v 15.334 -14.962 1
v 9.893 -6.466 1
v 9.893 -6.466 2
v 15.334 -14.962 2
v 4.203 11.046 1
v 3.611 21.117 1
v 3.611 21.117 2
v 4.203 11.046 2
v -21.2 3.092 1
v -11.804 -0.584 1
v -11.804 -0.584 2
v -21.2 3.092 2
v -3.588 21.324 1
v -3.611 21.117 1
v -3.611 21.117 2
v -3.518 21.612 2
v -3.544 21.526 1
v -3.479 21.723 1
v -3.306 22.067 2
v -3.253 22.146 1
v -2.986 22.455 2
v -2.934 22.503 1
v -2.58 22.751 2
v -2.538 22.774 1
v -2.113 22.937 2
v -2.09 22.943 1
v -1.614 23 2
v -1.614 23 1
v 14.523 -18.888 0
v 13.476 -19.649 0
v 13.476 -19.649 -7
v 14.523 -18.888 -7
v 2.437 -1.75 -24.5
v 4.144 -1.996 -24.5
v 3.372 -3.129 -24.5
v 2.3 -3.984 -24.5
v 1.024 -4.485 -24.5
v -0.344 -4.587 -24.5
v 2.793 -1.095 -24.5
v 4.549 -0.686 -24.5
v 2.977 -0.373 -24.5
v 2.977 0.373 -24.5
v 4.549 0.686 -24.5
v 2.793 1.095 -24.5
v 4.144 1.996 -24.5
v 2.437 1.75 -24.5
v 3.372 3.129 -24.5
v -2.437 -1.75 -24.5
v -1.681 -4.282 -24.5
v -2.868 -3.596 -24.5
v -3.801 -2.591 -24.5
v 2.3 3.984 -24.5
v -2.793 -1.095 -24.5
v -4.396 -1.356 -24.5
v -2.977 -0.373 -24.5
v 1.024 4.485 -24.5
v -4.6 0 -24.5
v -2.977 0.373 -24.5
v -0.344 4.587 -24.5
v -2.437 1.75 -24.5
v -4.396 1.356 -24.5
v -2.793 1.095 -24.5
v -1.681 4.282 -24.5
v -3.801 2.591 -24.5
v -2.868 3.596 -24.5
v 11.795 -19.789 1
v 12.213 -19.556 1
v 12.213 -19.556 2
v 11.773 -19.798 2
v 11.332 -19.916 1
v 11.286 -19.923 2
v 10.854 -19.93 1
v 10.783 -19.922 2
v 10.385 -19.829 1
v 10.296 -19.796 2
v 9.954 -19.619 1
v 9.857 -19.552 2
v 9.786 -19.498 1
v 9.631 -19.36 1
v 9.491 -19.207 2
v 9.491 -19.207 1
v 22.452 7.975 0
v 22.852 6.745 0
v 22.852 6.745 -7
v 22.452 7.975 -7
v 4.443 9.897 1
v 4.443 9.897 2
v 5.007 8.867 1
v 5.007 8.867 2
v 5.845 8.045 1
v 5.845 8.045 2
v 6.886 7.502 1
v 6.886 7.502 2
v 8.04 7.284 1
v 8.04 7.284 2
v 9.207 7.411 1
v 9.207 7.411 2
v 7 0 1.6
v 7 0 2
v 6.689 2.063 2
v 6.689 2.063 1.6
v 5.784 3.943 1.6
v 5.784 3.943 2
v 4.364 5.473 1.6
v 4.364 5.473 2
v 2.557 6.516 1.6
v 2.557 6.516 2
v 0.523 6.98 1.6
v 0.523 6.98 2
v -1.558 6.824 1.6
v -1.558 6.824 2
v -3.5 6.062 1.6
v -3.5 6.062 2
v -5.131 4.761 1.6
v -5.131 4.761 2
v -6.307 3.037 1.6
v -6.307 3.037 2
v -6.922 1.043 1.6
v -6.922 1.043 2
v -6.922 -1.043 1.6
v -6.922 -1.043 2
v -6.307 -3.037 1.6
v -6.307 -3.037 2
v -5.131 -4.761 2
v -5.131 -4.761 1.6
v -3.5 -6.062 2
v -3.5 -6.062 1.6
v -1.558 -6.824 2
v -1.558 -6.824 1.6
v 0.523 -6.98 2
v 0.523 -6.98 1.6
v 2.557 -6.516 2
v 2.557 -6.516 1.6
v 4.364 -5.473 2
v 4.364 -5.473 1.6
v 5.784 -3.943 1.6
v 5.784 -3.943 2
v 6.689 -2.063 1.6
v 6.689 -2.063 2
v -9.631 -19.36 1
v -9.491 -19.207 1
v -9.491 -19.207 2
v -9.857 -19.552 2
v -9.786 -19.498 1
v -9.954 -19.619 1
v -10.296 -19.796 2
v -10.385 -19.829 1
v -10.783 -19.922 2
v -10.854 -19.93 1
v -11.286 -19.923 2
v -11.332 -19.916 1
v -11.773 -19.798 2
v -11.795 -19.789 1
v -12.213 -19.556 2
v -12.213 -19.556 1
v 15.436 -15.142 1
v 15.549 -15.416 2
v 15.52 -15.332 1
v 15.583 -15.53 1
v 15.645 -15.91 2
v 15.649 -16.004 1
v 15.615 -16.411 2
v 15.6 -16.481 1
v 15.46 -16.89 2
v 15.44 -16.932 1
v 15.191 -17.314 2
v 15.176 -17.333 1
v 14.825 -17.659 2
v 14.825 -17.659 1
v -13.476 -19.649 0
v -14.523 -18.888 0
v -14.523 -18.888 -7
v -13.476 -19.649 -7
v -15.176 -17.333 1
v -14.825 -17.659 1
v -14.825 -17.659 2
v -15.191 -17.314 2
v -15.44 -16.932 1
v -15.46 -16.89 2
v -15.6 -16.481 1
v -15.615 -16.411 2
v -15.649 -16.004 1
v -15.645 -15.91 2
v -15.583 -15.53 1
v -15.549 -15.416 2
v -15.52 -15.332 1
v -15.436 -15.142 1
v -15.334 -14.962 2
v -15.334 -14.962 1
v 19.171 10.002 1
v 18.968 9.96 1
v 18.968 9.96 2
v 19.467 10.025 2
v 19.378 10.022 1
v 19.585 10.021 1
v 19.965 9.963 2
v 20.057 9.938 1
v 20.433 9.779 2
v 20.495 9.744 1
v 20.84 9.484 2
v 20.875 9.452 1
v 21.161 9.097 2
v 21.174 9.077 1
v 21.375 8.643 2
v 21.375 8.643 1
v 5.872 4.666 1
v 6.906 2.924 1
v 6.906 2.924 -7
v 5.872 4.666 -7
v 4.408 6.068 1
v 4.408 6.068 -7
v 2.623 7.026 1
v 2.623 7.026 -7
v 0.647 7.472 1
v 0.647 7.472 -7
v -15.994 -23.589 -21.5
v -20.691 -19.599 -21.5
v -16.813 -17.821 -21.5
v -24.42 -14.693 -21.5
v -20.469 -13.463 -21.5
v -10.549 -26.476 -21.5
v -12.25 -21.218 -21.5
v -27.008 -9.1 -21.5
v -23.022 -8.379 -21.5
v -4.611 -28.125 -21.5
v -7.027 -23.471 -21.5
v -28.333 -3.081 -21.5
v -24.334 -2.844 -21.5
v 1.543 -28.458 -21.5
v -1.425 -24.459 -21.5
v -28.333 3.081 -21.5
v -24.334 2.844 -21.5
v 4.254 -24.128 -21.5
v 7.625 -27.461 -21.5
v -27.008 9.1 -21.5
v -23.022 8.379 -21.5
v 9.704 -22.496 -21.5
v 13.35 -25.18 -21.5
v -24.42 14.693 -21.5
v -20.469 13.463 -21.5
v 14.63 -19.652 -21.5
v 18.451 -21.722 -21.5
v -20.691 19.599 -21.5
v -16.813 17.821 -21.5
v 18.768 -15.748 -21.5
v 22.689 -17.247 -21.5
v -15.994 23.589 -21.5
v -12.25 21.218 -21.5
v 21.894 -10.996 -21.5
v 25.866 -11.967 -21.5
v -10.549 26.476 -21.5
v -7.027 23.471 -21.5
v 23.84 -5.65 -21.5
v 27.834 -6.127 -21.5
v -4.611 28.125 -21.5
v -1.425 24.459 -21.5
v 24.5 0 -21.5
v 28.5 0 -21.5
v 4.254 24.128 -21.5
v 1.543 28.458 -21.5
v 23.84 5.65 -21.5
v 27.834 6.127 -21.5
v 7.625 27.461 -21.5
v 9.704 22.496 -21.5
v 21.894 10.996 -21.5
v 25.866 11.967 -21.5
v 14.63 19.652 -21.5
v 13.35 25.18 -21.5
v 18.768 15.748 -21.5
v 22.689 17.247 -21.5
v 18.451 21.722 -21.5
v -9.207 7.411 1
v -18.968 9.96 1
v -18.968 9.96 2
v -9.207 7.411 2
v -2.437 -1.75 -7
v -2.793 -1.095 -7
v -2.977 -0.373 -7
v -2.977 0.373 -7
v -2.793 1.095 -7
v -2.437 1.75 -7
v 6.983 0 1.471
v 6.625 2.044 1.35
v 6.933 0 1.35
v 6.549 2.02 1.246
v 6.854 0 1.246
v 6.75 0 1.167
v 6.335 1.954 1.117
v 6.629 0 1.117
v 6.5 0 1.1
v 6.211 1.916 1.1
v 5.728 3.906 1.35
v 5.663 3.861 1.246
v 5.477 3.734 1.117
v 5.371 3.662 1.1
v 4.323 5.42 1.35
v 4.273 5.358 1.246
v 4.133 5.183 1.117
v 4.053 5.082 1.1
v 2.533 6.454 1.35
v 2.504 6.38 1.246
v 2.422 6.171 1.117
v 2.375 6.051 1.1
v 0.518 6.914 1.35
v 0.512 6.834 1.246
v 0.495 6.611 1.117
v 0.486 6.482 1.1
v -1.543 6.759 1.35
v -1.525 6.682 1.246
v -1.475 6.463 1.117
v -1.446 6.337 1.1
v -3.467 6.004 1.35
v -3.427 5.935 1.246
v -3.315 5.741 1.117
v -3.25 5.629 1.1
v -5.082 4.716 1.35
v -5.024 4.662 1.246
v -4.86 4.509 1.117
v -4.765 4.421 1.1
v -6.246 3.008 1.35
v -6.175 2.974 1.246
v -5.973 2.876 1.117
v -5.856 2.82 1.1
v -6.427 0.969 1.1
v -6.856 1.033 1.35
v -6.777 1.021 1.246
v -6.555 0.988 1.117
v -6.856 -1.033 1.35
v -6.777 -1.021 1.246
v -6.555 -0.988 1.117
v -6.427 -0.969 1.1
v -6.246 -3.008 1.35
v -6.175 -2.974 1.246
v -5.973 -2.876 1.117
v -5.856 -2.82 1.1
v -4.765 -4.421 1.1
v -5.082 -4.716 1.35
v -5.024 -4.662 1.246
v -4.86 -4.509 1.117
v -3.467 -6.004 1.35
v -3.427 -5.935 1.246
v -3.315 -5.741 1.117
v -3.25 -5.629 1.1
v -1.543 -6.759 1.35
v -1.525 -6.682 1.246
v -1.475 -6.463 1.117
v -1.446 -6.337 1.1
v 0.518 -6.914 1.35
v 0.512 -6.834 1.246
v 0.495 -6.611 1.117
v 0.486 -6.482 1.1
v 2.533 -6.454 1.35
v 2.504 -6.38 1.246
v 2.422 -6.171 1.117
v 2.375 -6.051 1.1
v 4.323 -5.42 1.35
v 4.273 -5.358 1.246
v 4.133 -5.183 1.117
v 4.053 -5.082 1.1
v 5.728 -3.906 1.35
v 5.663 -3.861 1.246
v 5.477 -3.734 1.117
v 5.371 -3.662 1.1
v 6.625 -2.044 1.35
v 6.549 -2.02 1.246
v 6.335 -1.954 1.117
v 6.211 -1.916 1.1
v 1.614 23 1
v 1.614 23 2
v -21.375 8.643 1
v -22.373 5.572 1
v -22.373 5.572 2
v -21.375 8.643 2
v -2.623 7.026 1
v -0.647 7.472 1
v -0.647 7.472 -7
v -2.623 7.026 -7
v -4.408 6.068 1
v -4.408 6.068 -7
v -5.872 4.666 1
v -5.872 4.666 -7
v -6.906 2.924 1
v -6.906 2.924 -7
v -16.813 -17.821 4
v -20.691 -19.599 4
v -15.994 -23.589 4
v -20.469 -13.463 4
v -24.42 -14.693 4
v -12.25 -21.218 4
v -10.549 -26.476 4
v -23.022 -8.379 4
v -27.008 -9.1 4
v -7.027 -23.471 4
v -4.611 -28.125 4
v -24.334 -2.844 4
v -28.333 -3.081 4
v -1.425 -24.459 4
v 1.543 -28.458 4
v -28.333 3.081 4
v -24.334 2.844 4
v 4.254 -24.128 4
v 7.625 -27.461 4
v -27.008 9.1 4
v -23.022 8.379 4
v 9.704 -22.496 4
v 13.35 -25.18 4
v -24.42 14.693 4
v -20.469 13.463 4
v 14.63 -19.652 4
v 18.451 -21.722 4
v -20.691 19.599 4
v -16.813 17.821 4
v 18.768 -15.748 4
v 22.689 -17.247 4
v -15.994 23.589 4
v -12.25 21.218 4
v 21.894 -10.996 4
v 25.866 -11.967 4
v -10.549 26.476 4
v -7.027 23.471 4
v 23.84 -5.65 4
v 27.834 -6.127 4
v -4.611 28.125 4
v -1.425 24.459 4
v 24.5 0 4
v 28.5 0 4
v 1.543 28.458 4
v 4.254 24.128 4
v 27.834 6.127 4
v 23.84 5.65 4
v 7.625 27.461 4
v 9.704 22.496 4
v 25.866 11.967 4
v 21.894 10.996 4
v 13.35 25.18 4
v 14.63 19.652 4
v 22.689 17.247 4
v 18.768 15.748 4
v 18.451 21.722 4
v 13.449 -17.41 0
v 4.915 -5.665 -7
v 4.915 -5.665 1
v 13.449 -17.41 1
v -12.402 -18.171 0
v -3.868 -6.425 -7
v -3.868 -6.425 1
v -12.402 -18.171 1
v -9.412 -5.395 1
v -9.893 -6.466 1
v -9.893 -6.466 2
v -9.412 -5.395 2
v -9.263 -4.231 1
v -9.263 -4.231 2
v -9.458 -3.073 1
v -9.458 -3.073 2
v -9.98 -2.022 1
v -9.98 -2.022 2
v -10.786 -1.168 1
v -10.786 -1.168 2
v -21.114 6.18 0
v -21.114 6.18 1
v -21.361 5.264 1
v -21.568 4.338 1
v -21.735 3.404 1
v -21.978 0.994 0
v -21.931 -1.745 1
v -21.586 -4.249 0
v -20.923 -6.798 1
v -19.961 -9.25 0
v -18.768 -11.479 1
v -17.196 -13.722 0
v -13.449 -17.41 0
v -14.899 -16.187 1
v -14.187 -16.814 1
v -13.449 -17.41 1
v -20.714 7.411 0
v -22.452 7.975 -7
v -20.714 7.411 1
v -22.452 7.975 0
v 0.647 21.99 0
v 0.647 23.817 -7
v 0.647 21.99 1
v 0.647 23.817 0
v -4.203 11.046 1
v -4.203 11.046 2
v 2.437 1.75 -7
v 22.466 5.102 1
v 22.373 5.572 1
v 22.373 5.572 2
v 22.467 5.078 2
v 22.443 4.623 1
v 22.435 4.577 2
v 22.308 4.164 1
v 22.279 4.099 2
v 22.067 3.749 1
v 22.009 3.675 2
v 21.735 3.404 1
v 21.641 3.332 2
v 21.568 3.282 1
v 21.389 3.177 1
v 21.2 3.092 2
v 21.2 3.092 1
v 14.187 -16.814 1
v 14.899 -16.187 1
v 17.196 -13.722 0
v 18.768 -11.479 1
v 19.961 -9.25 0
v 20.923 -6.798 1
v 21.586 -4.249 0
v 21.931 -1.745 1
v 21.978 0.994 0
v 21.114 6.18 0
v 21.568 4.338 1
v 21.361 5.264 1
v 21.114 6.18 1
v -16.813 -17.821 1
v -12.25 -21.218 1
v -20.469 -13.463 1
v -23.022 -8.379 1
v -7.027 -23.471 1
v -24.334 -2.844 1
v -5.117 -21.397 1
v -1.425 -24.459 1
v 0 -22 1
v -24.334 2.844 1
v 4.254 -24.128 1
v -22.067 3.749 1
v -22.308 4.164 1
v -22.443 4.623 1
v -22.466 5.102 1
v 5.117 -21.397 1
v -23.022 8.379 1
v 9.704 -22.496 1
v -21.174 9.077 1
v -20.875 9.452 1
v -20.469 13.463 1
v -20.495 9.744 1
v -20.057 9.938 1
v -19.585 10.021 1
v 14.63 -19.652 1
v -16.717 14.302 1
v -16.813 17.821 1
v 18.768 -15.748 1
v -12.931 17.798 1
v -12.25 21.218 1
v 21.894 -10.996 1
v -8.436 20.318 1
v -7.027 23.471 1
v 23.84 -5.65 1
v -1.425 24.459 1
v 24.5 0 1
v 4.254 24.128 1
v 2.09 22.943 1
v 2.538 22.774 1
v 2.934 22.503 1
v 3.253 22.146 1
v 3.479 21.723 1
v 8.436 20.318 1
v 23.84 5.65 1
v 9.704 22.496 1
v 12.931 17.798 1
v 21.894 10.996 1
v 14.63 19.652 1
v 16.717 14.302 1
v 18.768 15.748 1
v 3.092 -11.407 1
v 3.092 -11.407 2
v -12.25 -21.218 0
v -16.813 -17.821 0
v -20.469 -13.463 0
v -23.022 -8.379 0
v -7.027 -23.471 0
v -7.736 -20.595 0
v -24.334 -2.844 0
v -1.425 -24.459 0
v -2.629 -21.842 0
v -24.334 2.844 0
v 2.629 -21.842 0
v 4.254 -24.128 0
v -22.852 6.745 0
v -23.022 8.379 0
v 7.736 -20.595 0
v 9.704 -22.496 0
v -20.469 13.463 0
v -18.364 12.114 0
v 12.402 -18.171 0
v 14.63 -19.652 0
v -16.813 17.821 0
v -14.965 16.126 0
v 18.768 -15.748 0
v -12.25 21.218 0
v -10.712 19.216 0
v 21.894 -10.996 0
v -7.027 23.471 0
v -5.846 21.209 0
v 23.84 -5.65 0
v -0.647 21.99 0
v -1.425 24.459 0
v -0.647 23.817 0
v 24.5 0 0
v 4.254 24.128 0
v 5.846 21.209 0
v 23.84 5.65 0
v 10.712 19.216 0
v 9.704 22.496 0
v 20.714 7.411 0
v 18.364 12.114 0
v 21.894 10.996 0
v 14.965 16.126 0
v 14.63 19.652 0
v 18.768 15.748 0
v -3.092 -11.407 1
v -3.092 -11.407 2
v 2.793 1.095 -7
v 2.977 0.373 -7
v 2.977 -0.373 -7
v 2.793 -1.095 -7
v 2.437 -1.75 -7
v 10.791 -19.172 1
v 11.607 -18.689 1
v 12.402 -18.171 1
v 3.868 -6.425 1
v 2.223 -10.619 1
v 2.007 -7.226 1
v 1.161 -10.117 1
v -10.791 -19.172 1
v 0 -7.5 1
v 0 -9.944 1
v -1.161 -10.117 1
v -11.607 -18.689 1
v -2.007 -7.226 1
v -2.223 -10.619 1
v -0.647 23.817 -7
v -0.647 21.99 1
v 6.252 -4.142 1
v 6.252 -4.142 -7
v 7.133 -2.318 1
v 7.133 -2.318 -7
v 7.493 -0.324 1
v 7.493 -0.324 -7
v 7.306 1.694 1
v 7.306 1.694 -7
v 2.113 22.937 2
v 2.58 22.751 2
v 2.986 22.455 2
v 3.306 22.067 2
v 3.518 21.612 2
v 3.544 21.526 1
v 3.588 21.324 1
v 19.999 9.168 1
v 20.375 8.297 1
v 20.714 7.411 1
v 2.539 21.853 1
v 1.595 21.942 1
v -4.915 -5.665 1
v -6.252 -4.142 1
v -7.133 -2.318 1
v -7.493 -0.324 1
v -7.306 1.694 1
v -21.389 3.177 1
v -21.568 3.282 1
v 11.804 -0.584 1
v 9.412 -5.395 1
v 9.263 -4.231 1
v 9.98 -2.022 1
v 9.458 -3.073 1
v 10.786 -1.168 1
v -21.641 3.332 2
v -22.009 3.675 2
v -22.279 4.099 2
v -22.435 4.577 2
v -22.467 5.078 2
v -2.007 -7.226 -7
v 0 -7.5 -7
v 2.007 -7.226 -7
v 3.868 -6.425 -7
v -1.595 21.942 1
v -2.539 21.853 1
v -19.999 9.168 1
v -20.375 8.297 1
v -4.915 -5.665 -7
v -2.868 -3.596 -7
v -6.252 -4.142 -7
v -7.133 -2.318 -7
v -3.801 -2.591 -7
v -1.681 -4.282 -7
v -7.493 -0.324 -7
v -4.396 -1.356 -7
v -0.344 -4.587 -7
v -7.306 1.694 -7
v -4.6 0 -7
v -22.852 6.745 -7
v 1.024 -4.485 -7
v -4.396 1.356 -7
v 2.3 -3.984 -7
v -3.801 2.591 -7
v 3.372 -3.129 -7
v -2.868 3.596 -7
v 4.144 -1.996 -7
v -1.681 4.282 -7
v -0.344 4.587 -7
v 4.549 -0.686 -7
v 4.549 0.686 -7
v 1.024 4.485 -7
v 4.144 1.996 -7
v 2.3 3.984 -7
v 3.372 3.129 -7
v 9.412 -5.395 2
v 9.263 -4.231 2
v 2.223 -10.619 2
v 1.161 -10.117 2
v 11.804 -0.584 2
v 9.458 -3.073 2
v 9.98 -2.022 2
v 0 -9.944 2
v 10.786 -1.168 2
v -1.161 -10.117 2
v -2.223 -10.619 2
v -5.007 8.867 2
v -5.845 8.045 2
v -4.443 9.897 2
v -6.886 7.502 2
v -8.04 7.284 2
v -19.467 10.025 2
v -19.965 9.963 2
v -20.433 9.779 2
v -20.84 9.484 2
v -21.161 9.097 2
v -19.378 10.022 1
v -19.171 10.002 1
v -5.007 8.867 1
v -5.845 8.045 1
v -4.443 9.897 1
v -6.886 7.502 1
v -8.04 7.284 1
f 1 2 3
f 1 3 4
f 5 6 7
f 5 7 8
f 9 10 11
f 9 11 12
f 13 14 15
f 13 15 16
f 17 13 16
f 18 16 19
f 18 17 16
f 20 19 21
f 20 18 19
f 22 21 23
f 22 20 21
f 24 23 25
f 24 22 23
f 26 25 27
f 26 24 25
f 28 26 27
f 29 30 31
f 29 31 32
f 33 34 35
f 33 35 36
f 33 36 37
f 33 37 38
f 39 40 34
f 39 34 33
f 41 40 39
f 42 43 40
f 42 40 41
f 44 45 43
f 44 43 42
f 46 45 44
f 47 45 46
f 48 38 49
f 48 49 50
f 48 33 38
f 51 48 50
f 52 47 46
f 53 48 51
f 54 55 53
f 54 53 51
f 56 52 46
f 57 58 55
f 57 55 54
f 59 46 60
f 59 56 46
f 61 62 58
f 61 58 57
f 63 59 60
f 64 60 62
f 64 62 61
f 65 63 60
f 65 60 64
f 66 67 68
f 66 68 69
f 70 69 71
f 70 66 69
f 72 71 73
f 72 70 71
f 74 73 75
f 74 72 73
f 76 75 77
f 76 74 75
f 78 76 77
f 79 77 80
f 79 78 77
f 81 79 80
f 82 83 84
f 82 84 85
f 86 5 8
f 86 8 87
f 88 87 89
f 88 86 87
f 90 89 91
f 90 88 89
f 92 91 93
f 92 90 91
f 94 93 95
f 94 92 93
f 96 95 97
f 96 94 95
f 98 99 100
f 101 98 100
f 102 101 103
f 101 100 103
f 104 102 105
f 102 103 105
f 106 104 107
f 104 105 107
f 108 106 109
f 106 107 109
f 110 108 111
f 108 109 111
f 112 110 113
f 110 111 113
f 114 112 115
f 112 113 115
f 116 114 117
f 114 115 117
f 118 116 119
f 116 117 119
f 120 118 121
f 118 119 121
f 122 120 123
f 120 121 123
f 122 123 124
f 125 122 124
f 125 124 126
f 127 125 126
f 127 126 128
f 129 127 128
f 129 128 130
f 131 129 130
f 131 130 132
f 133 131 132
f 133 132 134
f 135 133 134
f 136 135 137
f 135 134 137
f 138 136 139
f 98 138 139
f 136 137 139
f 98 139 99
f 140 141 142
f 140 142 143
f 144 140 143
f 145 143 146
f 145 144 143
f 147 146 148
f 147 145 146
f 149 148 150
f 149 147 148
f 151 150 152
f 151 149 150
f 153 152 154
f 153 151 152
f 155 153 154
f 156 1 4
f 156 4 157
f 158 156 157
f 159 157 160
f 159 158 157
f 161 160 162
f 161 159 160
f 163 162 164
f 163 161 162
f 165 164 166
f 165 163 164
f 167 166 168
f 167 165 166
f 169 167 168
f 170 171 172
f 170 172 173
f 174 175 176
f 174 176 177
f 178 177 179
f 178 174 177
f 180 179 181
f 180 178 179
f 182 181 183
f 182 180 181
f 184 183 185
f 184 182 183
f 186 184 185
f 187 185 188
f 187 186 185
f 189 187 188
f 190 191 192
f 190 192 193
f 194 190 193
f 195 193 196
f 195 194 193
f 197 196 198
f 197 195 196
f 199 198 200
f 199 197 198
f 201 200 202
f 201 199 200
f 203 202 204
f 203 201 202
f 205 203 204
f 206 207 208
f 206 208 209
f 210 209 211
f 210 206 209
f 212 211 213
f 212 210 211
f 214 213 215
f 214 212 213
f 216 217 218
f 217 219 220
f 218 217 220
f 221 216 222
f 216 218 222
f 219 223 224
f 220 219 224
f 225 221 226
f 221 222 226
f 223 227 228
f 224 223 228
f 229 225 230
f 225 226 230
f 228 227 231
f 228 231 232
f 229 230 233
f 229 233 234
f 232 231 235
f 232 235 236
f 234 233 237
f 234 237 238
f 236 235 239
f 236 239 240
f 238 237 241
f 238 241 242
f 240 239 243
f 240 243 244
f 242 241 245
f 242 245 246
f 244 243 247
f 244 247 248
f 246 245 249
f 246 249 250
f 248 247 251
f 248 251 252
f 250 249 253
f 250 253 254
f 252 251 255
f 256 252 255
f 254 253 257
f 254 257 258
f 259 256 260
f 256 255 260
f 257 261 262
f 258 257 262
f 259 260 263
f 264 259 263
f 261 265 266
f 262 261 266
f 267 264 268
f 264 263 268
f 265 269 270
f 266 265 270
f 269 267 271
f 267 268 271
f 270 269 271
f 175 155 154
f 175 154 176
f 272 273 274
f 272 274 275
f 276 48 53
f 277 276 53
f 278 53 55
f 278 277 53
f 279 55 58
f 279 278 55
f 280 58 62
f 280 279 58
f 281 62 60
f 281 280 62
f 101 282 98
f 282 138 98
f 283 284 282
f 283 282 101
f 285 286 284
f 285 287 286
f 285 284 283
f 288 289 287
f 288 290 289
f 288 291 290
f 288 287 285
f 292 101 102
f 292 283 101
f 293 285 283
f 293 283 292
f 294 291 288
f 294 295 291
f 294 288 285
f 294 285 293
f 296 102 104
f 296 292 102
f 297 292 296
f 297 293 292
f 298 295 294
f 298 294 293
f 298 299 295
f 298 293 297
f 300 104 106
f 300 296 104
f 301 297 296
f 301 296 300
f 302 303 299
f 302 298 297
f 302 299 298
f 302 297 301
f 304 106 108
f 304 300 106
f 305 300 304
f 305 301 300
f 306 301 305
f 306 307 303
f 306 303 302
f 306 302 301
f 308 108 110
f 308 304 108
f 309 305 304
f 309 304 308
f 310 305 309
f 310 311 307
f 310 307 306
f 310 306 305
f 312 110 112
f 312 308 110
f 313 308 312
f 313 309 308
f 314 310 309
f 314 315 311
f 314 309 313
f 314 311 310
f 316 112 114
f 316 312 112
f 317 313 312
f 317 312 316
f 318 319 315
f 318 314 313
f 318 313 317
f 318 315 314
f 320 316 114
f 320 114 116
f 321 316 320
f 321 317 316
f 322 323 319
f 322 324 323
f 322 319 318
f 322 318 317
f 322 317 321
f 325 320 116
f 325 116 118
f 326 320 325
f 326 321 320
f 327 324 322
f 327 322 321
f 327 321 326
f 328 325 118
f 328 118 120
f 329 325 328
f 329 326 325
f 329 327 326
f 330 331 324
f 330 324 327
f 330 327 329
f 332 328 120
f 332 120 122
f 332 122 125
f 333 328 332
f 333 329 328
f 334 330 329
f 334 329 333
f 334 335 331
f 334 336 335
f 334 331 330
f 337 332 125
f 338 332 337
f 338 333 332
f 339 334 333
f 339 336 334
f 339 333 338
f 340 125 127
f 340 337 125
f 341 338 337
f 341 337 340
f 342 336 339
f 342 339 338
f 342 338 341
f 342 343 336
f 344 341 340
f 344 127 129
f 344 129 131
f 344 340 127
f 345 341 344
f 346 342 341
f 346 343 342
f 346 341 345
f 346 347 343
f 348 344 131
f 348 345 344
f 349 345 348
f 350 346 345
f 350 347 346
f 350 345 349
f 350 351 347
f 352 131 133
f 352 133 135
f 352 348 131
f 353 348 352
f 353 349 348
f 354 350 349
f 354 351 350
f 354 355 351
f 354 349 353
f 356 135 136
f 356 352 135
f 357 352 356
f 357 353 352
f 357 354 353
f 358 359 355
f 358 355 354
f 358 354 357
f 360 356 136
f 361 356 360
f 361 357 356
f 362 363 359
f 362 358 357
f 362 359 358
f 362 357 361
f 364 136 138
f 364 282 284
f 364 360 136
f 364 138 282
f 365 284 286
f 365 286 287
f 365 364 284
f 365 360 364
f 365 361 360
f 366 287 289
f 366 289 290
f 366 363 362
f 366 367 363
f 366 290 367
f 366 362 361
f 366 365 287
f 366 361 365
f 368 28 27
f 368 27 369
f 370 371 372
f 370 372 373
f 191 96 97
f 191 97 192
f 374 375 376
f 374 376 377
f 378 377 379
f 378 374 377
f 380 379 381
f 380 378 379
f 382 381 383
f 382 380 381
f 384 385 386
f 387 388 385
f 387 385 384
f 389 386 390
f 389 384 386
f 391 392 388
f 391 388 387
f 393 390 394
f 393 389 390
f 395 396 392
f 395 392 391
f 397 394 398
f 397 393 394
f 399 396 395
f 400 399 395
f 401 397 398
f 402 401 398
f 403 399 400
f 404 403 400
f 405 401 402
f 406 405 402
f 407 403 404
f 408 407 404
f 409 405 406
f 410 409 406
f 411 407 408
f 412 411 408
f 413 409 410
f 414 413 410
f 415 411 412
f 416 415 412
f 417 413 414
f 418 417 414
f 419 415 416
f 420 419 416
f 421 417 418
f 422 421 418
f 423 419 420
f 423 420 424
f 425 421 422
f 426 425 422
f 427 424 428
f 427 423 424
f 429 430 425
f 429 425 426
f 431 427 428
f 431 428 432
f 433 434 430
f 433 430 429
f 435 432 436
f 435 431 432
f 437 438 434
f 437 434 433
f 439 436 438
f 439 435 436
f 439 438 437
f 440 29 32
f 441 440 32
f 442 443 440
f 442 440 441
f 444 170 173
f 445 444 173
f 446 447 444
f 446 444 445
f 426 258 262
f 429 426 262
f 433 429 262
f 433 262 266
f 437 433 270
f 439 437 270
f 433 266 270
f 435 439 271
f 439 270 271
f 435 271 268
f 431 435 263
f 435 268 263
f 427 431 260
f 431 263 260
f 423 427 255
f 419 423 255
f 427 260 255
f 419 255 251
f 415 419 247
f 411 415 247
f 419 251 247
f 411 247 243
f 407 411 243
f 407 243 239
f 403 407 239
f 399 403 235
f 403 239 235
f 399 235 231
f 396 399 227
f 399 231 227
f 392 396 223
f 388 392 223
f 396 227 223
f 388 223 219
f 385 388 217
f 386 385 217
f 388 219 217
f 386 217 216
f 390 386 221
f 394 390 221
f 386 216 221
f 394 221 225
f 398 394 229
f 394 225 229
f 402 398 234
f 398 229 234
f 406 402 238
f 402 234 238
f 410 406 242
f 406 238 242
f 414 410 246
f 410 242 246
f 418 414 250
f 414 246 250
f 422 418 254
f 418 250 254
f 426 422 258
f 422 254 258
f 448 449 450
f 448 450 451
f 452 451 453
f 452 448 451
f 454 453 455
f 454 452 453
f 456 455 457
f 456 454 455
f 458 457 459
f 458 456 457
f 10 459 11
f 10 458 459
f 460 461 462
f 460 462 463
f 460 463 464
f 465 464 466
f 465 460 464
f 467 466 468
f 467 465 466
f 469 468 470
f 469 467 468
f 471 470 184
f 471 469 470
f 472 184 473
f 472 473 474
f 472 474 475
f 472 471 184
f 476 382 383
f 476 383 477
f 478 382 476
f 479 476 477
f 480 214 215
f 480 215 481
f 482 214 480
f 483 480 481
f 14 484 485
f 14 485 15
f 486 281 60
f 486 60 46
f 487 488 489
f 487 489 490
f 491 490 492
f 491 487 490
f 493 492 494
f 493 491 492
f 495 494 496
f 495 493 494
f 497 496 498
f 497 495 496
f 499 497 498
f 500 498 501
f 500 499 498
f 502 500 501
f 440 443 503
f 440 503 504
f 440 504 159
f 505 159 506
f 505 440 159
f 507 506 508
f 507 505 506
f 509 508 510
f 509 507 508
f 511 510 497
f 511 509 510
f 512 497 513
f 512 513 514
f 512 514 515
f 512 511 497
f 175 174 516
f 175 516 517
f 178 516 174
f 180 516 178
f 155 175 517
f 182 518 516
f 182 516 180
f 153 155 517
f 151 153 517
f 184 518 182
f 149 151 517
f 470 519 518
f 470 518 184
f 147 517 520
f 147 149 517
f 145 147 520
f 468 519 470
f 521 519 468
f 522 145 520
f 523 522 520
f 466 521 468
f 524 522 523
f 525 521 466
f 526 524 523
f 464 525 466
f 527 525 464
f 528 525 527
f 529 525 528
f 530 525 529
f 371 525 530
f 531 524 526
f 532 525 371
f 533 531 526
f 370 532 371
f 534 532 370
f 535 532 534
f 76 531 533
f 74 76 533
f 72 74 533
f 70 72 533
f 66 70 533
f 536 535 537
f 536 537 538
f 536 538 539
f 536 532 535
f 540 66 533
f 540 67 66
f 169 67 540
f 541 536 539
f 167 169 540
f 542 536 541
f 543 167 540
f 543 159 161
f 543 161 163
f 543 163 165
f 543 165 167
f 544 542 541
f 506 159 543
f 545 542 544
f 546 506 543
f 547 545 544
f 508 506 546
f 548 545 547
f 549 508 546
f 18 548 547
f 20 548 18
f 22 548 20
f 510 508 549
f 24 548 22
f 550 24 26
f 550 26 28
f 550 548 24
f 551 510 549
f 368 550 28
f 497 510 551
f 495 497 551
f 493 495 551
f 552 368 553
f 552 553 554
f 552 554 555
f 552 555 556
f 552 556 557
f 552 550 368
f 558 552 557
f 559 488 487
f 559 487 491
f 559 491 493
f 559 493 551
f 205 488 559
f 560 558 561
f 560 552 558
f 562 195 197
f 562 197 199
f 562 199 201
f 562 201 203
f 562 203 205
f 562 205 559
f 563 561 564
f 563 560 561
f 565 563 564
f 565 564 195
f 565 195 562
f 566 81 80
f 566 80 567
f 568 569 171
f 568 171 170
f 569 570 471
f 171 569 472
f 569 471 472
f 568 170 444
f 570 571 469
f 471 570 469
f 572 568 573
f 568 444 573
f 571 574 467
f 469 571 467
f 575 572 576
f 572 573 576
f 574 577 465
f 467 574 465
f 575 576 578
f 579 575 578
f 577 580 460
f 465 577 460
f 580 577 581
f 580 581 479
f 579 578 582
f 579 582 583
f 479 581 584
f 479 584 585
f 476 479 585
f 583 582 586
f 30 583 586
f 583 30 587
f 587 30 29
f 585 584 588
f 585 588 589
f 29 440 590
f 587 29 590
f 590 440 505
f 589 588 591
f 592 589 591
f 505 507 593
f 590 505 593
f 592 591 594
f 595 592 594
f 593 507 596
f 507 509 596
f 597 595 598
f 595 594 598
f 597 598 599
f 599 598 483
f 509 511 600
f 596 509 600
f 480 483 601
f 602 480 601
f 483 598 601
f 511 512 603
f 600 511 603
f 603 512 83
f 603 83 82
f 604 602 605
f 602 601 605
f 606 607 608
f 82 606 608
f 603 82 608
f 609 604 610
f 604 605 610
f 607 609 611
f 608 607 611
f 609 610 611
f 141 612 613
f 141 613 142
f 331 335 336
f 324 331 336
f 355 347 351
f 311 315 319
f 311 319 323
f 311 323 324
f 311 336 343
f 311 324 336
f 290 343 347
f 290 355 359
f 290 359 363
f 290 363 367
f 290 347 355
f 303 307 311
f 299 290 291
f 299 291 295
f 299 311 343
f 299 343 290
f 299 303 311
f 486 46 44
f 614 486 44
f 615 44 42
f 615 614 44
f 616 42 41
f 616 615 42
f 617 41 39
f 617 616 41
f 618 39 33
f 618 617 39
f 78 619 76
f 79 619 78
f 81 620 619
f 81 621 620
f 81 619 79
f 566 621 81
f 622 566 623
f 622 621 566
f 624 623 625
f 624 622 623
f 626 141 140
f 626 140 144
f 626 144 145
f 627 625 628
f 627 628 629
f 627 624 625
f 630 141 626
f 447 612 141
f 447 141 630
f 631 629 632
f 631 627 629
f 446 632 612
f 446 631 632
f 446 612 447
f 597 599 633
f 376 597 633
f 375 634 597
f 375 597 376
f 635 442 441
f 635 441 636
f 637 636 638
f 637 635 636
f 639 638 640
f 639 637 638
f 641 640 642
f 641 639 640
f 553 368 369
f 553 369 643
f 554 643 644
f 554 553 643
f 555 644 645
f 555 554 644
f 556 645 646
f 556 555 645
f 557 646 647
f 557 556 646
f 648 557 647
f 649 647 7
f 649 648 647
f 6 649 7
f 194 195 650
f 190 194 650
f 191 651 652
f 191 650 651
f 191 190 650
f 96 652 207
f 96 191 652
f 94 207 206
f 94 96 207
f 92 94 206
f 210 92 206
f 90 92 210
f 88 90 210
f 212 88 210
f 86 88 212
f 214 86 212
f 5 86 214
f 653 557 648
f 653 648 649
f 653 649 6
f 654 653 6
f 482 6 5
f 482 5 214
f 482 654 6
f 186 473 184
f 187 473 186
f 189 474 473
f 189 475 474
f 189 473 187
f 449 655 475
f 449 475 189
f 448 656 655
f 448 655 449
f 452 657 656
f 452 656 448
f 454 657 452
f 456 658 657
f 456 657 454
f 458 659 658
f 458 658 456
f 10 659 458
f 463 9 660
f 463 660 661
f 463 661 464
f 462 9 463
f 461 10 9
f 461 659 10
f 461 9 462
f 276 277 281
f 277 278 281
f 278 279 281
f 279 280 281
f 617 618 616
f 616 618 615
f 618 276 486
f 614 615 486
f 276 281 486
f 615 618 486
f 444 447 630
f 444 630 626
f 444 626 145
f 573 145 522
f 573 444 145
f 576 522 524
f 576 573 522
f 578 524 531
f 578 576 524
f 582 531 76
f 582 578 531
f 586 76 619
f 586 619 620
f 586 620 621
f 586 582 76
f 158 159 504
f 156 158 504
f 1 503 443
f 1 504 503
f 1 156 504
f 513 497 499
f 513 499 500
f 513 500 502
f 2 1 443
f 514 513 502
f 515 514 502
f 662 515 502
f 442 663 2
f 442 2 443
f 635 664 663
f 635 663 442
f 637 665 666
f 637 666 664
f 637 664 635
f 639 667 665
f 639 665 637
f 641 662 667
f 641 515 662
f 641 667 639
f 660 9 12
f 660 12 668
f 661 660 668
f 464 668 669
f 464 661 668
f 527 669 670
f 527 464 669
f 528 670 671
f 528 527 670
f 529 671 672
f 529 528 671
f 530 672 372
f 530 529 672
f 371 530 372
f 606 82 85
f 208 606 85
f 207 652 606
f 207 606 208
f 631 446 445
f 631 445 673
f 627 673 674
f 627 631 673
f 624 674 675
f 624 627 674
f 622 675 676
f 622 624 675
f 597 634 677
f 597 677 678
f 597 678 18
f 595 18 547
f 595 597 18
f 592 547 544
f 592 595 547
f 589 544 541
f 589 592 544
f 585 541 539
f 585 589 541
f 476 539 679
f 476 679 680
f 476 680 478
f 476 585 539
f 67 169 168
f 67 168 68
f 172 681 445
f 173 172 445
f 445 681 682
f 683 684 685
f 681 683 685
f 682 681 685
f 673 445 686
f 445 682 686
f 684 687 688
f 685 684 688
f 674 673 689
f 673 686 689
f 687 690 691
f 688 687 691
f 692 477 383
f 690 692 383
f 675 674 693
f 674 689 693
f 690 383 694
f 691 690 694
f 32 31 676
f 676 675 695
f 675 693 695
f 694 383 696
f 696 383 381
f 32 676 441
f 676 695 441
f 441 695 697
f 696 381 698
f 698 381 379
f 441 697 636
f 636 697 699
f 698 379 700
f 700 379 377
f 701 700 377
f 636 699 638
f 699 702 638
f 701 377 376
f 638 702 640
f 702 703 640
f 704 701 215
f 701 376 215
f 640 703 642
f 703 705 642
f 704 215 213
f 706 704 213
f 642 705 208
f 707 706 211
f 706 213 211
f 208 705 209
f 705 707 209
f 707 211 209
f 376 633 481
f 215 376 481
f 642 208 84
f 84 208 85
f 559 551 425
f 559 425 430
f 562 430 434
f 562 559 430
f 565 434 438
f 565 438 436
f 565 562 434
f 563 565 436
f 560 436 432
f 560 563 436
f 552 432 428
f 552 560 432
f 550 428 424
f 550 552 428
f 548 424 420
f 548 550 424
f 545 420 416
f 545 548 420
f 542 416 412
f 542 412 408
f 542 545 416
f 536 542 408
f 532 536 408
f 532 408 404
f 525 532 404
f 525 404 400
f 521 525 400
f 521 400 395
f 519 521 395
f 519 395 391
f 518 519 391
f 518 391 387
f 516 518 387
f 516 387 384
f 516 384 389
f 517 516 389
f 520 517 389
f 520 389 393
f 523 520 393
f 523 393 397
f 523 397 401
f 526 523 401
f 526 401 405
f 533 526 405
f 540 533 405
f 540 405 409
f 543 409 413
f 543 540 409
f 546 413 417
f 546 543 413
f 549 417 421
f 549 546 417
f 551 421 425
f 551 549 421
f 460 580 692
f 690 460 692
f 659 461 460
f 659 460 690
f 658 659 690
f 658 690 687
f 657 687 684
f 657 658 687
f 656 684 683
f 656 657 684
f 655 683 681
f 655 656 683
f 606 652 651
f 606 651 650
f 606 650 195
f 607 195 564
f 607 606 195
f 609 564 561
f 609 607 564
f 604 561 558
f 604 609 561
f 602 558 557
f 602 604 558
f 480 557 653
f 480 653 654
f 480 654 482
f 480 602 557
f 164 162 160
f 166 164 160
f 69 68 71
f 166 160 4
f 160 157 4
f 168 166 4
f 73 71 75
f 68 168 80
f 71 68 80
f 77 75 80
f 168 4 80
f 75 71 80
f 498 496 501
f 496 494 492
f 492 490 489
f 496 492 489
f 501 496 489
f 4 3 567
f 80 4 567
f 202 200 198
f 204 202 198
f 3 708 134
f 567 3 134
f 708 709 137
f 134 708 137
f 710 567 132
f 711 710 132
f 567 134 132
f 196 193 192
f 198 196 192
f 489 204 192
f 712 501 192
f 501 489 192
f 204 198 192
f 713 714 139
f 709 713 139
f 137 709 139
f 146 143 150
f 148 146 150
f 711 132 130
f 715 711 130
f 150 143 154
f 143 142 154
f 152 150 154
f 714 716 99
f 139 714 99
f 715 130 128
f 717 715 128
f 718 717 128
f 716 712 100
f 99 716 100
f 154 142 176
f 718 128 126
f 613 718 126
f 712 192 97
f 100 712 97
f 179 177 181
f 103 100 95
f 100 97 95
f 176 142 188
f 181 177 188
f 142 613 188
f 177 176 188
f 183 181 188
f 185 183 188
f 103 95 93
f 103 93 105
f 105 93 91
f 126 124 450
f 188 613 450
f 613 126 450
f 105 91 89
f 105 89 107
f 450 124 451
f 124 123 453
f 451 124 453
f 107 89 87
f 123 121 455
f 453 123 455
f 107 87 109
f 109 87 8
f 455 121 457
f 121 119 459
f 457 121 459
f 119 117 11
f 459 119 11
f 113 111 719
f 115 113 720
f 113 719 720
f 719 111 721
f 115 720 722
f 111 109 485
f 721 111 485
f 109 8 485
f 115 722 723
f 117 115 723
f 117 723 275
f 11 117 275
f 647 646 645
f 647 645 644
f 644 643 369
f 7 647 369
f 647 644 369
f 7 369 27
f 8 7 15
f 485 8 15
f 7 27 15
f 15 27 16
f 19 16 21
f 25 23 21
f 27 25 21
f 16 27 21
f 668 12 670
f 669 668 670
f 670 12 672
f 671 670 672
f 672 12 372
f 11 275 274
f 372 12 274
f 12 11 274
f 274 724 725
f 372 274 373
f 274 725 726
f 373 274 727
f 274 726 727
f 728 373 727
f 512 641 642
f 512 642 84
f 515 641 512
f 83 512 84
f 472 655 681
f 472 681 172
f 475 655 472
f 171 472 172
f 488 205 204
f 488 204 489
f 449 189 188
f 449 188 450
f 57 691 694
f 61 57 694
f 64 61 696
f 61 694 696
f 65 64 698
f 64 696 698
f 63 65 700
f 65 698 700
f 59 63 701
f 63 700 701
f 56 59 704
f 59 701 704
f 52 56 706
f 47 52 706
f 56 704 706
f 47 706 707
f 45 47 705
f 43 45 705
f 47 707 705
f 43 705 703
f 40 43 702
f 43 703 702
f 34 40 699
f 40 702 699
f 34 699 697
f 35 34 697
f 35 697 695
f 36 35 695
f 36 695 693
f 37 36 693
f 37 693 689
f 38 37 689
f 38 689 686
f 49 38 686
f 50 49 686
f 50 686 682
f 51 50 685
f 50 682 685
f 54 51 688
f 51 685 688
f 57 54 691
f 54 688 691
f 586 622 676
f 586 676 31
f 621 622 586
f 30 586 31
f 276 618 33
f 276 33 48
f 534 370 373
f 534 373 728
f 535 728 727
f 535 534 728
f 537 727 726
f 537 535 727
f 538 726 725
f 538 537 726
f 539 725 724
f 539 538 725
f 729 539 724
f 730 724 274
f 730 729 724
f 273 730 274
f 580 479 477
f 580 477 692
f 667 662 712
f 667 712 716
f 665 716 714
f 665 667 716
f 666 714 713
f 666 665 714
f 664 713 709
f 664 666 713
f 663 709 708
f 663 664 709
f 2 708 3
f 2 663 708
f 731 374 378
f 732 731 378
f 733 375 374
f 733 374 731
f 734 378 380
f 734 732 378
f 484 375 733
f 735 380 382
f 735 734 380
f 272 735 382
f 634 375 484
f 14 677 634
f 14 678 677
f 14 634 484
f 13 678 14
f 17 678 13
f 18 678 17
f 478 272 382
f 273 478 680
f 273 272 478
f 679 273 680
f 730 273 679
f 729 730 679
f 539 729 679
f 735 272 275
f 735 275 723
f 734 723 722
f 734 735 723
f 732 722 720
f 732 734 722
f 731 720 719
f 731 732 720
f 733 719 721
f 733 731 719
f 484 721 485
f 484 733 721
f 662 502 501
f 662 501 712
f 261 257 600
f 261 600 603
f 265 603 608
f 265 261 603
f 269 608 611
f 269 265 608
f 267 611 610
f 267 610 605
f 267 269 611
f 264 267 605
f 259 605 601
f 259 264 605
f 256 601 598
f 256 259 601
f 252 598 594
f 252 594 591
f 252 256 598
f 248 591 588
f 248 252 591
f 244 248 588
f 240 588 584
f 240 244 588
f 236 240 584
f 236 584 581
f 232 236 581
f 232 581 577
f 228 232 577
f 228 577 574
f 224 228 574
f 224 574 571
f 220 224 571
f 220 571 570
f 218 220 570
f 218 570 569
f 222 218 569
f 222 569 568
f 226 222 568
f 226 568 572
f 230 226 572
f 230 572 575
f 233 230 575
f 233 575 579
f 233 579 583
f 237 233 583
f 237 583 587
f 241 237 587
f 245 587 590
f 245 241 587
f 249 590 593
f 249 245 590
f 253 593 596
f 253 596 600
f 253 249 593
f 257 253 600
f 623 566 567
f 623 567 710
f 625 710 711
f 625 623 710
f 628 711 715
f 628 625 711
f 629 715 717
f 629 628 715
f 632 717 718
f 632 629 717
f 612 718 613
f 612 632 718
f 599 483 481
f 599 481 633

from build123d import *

# Parameters (mm, degrees)
SKETCH1_R                = 24.5
SKETCH1_R_2              = 22
BOSS_EXTRUDE1_DEPTH      = 1
BOSS_EXTRUDE2_DEPTH      = 1
SKETCH3_R                = 7
CUT_EXTRUDE1_DEPTH       = 0.9
FILLET1_R                = 0.5
BOSS_EXTRUDE3_DEPTH      = 4
BOSS_EXTRUDE3_DEPTH_BACK = 21.5
SKETCH4_R                = 28.5
SKETCH4_R_2              = 24.5
BOSS_EXTRUDE4_DEPTH      = 8
SKETCH6_R                = 4.6
BOSS_EXTRUDE5_DEPTH      = 17.5


with BuildPart() as part:
    # Sketch1 → Boss-Extrude1 (new body)
    with BuildSketch(Plane.XY):
        Circle(SKETCH1_R)
        Circle(SKETCH1_R_2, mode=Mode.SUBTRACT)
    extrude(amount=BOSS_EXTRUDE1_DEPTH)

    # Sketch2 → Boss-Extrude2 (add)
    with BuildSketch(Plane.XY.offset(1)):
        with BuildLine():
            Line((-1.614189839, 23), (1.614189839, 23))
            ThreePointArc((1.614189839, 23), (2.986252504, 22.455143994), (3.610738586, 21.117444044))
            Line((3.610738586, 21.117444044), (4.203159318, 11.046291601))
            ThreePointArc((4.203159318, 11.046291601), (5.845115801, 8.045111712), (9.206799949, 7.410933888))
            Line((9.206799949, 7.410933888), (18.96810318, 9.959665548))
            ThreePointArc((18.96810318, 9.959665548), (20.433308247, 9.779116009), (21.375487782, 8.642576636))
            Line((21.375487782, 8.642576636), (22.373111967, 5.572205105))
            ThreePointArc((22.373111967, 5.572205105), (22.278913793, 4.098926202), (21.199662351, 3.091632627))
            Line((21.199662351, 3.091632627), (11.804495268, -0.583950228))
            ThreePointArc((11.804495268, -0.583950228), (9.457596034, -3.072959231), (9.893274614, -6.46608257))
            Line((9.893274614, -6.46608257), (15.333671053, -14.962032219))
            ThreePointArc((15.333671053, -14.962032219), (15.614731503, -16.411317921), (14.824967815, -17.658593889))
            Line((14.824967815, -17.658593889), (12.213153791, -19.556187853))
            ThreePointArc((12.213153791, -19.556187853), (10.782873453, -19.921868284), (9.491373297, -19.20671))
            Line((9.491373297, -19.20671), (3.092419978, -11.40719269))
            ThreePointArc((3.092419978, -11.40719269), (0, -9.944304962), (-3.092419978, -11.40719269))
            Line((-3.092419978, -11.40719269), (-9.491373297, -19.20671))
            ThreePointArc((-9.491373297, -19.20671), (-10.782873453, -19.921868284), (-12.213153791, -19.556187853))
            Line((-12.213153791, -19.556187853), (-14.824967815, -17.658593889))
            ThreePointArc((-14.824967815, -17.658593889), (-15.614731503, -16.411317921), (-15.333671053, -14.962032219))
            Line((-15.333671053, -14.962032219), (-9.893274614, -6.46608257))
            ThreePointArc((-9.893274614, -6.46608257), (-9.457596034, -3.072959231), (-11.804495268, -0.583950228))
            Line((-11.804495268, -0.583950228), (-21.199662351, 3.091632627))
            ThreePointArc((-21.199662351, 3.091632627), (-22.278913793, 4.098926202), (-22.373111967, 5.572205105))
            Line((-22.373111967, 5.572205105), (-21.375487782, 8.642576636))
            ThreePointArc((-21.375487782, 8.642576636), (-20.433308247, 9.779116009), (-18.96810318, 9.959665548))
            Line((-18.96810318, 9.959665548), (-9.206799949, 7.410933888))
            ThreePointArc((-9.206799949, 7.410933888), (-5.845115801, 8.045111712), (-4.203159318, 11.046291601))
            Line((-4.203159318, 11.046291601), (-3.610738586, 21.117444044))
            ThreePointArc((-3.610738586, 21.117444044), (-2.986252504, 22.455143994), (-1.614189839, 23))
        make_face()
    extrude(amount=BOSS_EXTRUDE2_DEPTH)

    # Sketch3 → Cut-Extrude1 (cut)
    with BuildSketch(Plane.XY.offset(2)):
        Circle(SKETCH3_R)
    extrude(amount=-CUT_EXTRUDE1_DEPTH, mode=Mode.SUBTRACT)

    # Fillet1
    fillet1_edges = [part.edges().sort_by_distance(p)[0] for p in [
        (-7, 0, 1.1),
    ]]
    fillet(fillet1_edges, radius=FILLET1_R)

    # Sketch4 → Boss-Extrude3 (add, two sides: drawn at the far end of the back side and taken through both)
    with BuildSketch(Plane.XY.offset(-BOSS_EXTRUDE3_DEPTH_BACK)):
        Circle(SKETCH4_R)
        Circle(SKETCH4_R_2, mode=Mode.SUBTRACT)
    extrude(amount=BOSS_EXTRUDE3_DEPTH + BOSS_EXTRUDE3_DEPTH_BACK)

    # Sketch5 → Boss-Extrude4 (add)
    with BuildSketch(Plane(origin=(0, 0, 1), x_dir=(-1, 0, 0), z_dir=(0, 0, -1))):
        with BuildLine():
            Line((22.451817346, 7.975399256), (22.851723851, 6.744613588))
            Line((22.851723851, 6.744613588), (7.30628104, 1.693593032))
            ThreePointArc((7.30628104, 1.693593032), (7.132923872, -2.317627458), (4.915436519, -5.664669789))
            Line((4.915436519, -5.664669789), (14.523048547, -18.888413283))
            Line((14.523048547, -18.888413283), (13.476079724, -19.649080658))
            Line((13.476079724, -19.649080658), (3.868467697, -6.425337165))
            ThreePointArc((3.868467697, -6.425337165), (0, -7.5), (-3.868467697, -6.425337165))
            Line((-3.868467697, -6.425337165), (-13.476079724, -19.649080658))
            Line((-13.476079724, -19.649080658), (-14.523048547, -18.888413283))
            Line((-14.523048547, -18.888413283), (-4.915436519, -5.664669789))
            ThreePointArc((-4.915436519, -5.664669789), (-7.132923872, -2.317627458), (-7.30628104, 1.693593032))
            Line((-7.30628104, 1.693593032), (-22.851723851, 6.744613588))
            Line((-22.851723851, 6.744613588), (-22.451817346, 7.975399256))
            Line((-22.451817346, 7.975399256), (-6.906374535, 2.9243787))
            ThreePointArc((-6.906374535, 2.9243787), (-4.408389392, 6.067627458), (-0.647062318, 7.472035222))
            Line((-0.647062318, 7.472035222), (-0.647062318, 23.817481096))
            Line((-0.647062318, 23.817481096), (0.647062318, 23.817481096))
            Line((0.647062318, 23.817481096), (0.647062318, 7.472035222))
            ThreePointArc((0.647062318, 7.472035222), (4.408389392, 6.067627458), (6.906374535, 2.9243787))
            Line((6.906374535, 2.9243787), (22.451817346, 7.975399256))
        make_face()
    extrude(amount=BOSS_EXTRUDE4_DEPTH)

    # Sketch6 → Boss-Extrude5 (add)
    with BuildSketch(Plane(origin=(0, 0, -7), x_dir=(-1, 0, 0), z_dir=(0, 0, -1))):
        Circle(SKETCH6_R)
        with BuildLine():
            Line((-2.436698586, -1.75), (2.436698586, -1.75))
            ThreePointArc((2.436698586, -1.75), (3, 0), (2.436698586, 1.75))
            Line((2.436698586, 1.75), (-2.436698586, 1.75))
            ThreePointArc((-2.436698586, 1.75), (-3, 0), (-2.436698586, -1.75))
        make_face(mode=Mode.SUBTRACT)
    extrude(amount=BOSS_EXTRUDE5_DEPTH)


solid = part.part
